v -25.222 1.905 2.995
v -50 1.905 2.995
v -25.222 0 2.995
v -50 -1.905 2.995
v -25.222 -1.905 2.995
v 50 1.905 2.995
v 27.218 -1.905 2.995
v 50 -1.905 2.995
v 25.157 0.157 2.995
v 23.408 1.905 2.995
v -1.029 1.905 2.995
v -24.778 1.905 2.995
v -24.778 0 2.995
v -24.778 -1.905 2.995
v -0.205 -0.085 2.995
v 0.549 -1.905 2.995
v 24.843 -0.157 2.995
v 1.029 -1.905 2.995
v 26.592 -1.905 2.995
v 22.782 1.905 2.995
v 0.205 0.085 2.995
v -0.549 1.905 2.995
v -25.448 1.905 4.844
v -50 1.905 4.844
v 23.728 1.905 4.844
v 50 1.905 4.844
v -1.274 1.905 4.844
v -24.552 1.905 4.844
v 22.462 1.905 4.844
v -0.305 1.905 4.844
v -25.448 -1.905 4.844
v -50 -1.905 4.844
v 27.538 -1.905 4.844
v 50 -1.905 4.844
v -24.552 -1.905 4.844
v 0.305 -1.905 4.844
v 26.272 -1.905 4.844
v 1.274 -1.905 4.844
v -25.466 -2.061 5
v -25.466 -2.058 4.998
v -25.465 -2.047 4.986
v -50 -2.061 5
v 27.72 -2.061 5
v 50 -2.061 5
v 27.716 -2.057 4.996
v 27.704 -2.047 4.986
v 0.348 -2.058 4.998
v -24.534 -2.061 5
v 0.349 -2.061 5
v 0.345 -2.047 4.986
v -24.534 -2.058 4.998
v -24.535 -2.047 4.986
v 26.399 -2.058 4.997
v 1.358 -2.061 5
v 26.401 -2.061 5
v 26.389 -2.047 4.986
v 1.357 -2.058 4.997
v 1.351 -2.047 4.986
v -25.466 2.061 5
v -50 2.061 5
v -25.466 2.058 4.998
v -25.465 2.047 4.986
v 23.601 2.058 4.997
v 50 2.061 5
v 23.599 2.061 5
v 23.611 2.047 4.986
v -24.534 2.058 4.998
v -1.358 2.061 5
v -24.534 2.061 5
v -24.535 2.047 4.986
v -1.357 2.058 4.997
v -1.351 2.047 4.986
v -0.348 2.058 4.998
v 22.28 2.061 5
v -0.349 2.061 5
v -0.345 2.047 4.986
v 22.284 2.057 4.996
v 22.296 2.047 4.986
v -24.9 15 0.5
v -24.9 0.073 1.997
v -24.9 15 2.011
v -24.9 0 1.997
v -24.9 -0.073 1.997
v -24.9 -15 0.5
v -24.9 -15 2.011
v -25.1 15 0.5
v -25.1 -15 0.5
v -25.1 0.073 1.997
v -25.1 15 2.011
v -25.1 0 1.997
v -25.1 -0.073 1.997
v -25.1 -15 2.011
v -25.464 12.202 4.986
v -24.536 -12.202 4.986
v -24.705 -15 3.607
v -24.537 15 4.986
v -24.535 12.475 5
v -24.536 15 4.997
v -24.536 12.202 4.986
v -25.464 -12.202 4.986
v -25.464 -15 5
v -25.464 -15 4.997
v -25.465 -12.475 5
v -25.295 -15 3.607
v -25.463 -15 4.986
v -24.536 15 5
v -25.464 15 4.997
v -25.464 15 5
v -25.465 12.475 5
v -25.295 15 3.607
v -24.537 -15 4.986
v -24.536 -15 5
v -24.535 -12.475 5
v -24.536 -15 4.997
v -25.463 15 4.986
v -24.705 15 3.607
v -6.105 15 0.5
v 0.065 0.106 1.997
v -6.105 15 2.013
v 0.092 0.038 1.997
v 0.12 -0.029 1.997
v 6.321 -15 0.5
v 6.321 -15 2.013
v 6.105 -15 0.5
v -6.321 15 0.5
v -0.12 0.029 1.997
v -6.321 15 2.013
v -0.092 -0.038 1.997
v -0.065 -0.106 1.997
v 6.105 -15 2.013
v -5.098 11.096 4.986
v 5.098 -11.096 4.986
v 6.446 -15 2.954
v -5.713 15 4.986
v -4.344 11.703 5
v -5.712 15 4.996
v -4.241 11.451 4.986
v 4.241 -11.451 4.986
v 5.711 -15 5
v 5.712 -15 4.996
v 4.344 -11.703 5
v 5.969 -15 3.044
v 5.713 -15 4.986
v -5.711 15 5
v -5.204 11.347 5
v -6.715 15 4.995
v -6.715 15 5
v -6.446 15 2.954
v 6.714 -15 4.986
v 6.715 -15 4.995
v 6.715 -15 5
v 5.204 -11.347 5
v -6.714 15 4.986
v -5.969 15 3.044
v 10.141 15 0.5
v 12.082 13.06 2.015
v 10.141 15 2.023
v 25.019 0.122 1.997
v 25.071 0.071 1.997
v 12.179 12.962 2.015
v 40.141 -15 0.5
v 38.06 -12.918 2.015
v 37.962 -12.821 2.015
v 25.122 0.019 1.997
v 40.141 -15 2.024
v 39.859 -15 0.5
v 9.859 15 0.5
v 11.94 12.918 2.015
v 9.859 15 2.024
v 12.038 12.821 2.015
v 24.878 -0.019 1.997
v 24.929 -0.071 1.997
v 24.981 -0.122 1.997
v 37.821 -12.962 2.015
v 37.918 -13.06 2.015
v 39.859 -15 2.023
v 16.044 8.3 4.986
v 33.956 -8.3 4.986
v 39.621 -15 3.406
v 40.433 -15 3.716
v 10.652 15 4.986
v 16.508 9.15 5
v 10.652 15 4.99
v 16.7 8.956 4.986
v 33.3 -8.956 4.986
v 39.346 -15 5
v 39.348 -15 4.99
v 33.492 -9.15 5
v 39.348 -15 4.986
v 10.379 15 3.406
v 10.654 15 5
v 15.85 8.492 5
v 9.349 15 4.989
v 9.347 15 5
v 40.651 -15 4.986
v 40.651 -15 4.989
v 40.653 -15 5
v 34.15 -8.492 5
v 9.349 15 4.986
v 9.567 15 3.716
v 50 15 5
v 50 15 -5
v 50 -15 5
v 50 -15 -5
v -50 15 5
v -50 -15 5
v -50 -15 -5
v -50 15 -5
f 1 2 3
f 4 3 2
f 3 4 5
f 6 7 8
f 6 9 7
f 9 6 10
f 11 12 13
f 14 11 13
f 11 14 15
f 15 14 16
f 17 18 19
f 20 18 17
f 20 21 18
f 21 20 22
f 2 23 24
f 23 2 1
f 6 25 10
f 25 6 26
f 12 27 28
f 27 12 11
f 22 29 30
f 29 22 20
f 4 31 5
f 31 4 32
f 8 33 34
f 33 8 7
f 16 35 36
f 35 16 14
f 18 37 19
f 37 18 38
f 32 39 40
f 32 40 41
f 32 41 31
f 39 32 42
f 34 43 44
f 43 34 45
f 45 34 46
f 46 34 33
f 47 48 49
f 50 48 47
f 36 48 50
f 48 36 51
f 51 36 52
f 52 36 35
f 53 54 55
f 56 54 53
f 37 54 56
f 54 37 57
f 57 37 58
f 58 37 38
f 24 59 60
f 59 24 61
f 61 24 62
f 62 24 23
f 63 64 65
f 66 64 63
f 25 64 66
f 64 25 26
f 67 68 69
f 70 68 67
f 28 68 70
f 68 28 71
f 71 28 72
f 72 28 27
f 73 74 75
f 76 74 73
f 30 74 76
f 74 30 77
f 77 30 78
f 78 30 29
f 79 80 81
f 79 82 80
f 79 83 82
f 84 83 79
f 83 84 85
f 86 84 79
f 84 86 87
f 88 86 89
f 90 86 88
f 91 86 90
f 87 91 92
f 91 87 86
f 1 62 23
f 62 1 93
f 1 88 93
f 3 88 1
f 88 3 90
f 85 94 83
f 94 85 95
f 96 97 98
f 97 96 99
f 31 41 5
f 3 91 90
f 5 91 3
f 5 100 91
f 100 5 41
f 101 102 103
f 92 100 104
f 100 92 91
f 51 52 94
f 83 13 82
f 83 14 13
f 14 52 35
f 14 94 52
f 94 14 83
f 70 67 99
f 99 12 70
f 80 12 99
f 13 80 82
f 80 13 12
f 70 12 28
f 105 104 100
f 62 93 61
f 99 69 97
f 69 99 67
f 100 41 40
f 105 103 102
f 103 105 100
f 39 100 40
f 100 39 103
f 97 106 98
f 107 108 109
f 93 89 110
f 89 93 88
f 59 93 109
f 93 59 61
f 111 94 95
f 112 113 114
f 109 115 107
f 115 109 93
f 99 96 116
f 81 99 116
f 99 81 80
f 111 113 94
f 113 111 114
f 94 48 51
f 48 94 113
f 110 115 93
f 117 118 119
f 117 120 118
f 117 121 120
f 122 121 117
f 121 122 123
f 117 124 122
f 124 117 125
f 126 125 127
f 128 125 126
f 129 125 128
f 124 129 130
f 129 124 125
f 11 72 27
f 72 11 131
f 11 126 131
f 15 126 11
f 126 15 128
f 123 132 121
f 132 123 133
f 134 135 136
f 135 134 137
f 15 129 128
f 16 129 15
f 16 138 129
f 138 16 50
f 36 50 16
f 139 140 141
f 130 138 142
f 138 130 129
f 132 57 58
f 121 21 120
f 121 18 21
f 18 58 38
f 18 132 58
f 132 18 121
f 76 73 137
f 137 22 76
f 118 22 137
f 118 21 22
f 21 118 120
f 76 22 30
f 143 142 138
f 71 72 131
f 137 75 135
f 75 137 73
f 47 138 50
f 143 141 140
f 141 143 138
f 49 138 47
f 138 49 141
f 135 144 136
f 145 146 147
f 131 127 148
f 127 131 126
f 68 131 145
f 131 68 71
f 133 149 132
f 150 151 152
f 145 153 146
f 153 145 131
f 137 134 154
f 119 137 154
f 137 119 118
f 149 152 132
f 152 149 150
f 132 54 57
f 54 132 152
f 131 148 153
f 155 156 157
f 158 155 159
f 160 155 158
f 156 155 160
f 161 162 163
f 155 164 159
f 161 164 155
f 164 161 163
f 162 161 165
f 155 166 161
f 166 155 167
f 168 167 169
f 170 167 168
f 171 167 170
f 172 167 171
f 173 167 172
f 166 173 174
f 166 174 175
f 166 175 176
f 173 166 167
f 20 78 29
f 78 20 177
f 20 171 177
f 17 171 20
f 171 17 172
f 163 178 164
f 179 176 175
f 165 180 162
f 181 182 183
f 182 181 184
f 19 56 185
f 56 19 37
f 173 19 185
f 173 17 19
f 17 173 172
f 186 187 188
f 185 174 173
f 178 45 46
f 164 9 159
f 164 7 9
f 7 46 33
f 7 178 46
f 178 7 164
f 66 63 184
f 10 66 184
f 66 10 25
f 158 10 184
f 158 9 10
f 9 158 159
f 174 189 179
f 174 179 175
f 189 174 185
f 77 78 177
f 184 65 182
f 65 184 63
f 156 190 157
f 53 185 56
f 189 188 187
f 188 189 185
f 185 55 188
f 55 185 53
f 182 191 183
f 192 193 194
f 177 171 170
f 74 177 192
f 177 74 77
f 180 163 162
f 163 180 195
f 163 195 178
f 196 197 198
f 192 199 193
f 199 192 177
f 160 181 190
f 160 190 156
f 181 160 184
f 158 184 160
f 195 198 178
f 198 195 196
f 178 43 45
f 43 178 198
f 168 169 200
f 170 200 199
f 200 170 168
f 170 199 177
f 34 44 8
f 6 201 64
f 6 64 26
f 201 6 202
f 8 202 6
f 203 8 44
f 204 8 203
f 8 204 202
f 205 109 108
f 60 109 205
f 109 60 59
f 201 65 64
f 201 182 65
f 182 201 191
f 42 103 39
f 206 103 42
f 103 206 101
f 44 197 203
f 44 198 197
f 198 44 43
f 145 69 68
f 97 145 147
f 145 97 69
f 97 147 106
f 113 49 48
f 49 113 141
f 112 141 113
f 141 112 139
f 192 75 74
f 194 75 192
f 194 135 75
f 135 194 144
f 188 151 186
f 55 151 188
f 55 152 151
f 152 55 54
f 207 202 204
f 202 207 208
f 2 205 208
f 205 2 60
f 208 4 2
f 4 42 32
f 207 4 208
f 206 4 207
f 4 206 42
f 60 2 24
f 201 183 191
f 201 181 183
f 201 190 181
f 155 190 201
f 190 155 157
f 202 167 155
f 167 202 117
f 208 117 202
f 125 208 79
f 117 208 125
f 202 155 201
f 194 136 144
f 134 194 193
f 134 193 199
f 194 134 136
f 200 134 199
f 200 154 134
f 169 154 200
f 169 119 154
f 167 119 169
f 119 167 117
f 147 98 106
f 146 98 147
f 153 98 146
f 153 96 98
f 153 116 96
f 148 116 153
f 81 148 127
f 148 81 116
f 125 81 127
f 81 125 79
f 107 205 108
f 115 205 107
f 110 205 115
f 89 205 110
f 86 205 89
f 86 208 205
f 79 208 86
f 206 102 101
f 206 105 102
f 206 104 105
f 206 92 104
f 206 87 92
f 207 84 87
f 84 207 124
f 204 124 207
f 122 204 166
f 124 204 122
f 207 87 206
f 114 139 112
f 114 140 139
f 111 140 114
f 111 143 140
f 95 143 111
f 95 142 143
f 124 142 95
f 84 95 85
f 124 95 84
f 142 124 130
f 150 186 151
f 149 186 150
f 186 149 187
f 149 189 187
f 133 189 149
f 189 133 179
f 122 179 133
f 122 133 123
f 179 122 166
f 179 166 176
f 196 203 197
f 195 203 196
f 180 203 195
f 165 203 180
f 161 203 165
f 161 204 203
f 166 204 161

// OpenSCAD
/*[ Overall Dimensions in mm]*/
block_x = 100; // [50 : 10 : 200]
block_y = 30; // [10 : 5 : 100]
block_z = 10; // [5 : 1 : 20]

/*[ Tape Channel in mm ]*/
tape_channel_depth = 2.0;  // [1 : 1 : 5]
tape_channel_width = 3.81; // [3.81:Cassette 1/8 inch, 6.35:Reel-to-reel 1/4 inch]

/*[ Blade width in mm ]*/
cut_width = 0.2; // [0.1 : 0.1 : 1]


block();

module block() {
    $fn = 30;
    
    difference(){
        cube([block_x, block_y, block_z], true);
        
        translate([0,0,block_z/2.0 - tape_channel_depth/2.0]) channel();
        
        //rotate and place (z translation is already handled)
        translate([-block_x/4.0 ,0,0]) cut();
        translate([0 ,0,0]) rotate([0,0,22.5] )cut();
        translate([block_x/4.0 ,0,0]) rotate([0,0,45])cut();
    }
}

module channel() {
    channel_x = block_x * 1.1;
    union() {
        //the channel
        cube([channel_x, tape_channel_width, tape_channel_depth+.01], true);
        //angled edges
        rotate([45,0,0]) translate([0,0,tape_channel_depth])
            cube([channel_x, 1.5, tape_channel_depth], true);
        rotate([-45,0,0]) translate([0,0,tape_channel_depth])
            cube([channel_x, 1.5, tape_channel_depth], true);
    }
}

module cut() {
    cut_y = block_y * 3;
    cut_z = tape_channel_depth * 1.5;
    
    tans_z = block_z /2.0 - cut_z;
   
    union() {
        //the actual thin cut channel
        translate([0,0,tans_z]) cube([cut_width, cut_y, cut_z], true);
        //the cut champfer
        scale([1,cut_y/(cut_width/2.0),1])
            hull() {
                translate([cut_width*2.0, 0, block_z /2.0]) sphere(d=cut_width/1.5, true);
                translate([-cut_width*2.0, 0,block_z /2.0]) sphere(d=cut_width/1.5, true);
                translate([0,0,tans_z]) sphere(d=cut_width, true);
            }
    }
}
